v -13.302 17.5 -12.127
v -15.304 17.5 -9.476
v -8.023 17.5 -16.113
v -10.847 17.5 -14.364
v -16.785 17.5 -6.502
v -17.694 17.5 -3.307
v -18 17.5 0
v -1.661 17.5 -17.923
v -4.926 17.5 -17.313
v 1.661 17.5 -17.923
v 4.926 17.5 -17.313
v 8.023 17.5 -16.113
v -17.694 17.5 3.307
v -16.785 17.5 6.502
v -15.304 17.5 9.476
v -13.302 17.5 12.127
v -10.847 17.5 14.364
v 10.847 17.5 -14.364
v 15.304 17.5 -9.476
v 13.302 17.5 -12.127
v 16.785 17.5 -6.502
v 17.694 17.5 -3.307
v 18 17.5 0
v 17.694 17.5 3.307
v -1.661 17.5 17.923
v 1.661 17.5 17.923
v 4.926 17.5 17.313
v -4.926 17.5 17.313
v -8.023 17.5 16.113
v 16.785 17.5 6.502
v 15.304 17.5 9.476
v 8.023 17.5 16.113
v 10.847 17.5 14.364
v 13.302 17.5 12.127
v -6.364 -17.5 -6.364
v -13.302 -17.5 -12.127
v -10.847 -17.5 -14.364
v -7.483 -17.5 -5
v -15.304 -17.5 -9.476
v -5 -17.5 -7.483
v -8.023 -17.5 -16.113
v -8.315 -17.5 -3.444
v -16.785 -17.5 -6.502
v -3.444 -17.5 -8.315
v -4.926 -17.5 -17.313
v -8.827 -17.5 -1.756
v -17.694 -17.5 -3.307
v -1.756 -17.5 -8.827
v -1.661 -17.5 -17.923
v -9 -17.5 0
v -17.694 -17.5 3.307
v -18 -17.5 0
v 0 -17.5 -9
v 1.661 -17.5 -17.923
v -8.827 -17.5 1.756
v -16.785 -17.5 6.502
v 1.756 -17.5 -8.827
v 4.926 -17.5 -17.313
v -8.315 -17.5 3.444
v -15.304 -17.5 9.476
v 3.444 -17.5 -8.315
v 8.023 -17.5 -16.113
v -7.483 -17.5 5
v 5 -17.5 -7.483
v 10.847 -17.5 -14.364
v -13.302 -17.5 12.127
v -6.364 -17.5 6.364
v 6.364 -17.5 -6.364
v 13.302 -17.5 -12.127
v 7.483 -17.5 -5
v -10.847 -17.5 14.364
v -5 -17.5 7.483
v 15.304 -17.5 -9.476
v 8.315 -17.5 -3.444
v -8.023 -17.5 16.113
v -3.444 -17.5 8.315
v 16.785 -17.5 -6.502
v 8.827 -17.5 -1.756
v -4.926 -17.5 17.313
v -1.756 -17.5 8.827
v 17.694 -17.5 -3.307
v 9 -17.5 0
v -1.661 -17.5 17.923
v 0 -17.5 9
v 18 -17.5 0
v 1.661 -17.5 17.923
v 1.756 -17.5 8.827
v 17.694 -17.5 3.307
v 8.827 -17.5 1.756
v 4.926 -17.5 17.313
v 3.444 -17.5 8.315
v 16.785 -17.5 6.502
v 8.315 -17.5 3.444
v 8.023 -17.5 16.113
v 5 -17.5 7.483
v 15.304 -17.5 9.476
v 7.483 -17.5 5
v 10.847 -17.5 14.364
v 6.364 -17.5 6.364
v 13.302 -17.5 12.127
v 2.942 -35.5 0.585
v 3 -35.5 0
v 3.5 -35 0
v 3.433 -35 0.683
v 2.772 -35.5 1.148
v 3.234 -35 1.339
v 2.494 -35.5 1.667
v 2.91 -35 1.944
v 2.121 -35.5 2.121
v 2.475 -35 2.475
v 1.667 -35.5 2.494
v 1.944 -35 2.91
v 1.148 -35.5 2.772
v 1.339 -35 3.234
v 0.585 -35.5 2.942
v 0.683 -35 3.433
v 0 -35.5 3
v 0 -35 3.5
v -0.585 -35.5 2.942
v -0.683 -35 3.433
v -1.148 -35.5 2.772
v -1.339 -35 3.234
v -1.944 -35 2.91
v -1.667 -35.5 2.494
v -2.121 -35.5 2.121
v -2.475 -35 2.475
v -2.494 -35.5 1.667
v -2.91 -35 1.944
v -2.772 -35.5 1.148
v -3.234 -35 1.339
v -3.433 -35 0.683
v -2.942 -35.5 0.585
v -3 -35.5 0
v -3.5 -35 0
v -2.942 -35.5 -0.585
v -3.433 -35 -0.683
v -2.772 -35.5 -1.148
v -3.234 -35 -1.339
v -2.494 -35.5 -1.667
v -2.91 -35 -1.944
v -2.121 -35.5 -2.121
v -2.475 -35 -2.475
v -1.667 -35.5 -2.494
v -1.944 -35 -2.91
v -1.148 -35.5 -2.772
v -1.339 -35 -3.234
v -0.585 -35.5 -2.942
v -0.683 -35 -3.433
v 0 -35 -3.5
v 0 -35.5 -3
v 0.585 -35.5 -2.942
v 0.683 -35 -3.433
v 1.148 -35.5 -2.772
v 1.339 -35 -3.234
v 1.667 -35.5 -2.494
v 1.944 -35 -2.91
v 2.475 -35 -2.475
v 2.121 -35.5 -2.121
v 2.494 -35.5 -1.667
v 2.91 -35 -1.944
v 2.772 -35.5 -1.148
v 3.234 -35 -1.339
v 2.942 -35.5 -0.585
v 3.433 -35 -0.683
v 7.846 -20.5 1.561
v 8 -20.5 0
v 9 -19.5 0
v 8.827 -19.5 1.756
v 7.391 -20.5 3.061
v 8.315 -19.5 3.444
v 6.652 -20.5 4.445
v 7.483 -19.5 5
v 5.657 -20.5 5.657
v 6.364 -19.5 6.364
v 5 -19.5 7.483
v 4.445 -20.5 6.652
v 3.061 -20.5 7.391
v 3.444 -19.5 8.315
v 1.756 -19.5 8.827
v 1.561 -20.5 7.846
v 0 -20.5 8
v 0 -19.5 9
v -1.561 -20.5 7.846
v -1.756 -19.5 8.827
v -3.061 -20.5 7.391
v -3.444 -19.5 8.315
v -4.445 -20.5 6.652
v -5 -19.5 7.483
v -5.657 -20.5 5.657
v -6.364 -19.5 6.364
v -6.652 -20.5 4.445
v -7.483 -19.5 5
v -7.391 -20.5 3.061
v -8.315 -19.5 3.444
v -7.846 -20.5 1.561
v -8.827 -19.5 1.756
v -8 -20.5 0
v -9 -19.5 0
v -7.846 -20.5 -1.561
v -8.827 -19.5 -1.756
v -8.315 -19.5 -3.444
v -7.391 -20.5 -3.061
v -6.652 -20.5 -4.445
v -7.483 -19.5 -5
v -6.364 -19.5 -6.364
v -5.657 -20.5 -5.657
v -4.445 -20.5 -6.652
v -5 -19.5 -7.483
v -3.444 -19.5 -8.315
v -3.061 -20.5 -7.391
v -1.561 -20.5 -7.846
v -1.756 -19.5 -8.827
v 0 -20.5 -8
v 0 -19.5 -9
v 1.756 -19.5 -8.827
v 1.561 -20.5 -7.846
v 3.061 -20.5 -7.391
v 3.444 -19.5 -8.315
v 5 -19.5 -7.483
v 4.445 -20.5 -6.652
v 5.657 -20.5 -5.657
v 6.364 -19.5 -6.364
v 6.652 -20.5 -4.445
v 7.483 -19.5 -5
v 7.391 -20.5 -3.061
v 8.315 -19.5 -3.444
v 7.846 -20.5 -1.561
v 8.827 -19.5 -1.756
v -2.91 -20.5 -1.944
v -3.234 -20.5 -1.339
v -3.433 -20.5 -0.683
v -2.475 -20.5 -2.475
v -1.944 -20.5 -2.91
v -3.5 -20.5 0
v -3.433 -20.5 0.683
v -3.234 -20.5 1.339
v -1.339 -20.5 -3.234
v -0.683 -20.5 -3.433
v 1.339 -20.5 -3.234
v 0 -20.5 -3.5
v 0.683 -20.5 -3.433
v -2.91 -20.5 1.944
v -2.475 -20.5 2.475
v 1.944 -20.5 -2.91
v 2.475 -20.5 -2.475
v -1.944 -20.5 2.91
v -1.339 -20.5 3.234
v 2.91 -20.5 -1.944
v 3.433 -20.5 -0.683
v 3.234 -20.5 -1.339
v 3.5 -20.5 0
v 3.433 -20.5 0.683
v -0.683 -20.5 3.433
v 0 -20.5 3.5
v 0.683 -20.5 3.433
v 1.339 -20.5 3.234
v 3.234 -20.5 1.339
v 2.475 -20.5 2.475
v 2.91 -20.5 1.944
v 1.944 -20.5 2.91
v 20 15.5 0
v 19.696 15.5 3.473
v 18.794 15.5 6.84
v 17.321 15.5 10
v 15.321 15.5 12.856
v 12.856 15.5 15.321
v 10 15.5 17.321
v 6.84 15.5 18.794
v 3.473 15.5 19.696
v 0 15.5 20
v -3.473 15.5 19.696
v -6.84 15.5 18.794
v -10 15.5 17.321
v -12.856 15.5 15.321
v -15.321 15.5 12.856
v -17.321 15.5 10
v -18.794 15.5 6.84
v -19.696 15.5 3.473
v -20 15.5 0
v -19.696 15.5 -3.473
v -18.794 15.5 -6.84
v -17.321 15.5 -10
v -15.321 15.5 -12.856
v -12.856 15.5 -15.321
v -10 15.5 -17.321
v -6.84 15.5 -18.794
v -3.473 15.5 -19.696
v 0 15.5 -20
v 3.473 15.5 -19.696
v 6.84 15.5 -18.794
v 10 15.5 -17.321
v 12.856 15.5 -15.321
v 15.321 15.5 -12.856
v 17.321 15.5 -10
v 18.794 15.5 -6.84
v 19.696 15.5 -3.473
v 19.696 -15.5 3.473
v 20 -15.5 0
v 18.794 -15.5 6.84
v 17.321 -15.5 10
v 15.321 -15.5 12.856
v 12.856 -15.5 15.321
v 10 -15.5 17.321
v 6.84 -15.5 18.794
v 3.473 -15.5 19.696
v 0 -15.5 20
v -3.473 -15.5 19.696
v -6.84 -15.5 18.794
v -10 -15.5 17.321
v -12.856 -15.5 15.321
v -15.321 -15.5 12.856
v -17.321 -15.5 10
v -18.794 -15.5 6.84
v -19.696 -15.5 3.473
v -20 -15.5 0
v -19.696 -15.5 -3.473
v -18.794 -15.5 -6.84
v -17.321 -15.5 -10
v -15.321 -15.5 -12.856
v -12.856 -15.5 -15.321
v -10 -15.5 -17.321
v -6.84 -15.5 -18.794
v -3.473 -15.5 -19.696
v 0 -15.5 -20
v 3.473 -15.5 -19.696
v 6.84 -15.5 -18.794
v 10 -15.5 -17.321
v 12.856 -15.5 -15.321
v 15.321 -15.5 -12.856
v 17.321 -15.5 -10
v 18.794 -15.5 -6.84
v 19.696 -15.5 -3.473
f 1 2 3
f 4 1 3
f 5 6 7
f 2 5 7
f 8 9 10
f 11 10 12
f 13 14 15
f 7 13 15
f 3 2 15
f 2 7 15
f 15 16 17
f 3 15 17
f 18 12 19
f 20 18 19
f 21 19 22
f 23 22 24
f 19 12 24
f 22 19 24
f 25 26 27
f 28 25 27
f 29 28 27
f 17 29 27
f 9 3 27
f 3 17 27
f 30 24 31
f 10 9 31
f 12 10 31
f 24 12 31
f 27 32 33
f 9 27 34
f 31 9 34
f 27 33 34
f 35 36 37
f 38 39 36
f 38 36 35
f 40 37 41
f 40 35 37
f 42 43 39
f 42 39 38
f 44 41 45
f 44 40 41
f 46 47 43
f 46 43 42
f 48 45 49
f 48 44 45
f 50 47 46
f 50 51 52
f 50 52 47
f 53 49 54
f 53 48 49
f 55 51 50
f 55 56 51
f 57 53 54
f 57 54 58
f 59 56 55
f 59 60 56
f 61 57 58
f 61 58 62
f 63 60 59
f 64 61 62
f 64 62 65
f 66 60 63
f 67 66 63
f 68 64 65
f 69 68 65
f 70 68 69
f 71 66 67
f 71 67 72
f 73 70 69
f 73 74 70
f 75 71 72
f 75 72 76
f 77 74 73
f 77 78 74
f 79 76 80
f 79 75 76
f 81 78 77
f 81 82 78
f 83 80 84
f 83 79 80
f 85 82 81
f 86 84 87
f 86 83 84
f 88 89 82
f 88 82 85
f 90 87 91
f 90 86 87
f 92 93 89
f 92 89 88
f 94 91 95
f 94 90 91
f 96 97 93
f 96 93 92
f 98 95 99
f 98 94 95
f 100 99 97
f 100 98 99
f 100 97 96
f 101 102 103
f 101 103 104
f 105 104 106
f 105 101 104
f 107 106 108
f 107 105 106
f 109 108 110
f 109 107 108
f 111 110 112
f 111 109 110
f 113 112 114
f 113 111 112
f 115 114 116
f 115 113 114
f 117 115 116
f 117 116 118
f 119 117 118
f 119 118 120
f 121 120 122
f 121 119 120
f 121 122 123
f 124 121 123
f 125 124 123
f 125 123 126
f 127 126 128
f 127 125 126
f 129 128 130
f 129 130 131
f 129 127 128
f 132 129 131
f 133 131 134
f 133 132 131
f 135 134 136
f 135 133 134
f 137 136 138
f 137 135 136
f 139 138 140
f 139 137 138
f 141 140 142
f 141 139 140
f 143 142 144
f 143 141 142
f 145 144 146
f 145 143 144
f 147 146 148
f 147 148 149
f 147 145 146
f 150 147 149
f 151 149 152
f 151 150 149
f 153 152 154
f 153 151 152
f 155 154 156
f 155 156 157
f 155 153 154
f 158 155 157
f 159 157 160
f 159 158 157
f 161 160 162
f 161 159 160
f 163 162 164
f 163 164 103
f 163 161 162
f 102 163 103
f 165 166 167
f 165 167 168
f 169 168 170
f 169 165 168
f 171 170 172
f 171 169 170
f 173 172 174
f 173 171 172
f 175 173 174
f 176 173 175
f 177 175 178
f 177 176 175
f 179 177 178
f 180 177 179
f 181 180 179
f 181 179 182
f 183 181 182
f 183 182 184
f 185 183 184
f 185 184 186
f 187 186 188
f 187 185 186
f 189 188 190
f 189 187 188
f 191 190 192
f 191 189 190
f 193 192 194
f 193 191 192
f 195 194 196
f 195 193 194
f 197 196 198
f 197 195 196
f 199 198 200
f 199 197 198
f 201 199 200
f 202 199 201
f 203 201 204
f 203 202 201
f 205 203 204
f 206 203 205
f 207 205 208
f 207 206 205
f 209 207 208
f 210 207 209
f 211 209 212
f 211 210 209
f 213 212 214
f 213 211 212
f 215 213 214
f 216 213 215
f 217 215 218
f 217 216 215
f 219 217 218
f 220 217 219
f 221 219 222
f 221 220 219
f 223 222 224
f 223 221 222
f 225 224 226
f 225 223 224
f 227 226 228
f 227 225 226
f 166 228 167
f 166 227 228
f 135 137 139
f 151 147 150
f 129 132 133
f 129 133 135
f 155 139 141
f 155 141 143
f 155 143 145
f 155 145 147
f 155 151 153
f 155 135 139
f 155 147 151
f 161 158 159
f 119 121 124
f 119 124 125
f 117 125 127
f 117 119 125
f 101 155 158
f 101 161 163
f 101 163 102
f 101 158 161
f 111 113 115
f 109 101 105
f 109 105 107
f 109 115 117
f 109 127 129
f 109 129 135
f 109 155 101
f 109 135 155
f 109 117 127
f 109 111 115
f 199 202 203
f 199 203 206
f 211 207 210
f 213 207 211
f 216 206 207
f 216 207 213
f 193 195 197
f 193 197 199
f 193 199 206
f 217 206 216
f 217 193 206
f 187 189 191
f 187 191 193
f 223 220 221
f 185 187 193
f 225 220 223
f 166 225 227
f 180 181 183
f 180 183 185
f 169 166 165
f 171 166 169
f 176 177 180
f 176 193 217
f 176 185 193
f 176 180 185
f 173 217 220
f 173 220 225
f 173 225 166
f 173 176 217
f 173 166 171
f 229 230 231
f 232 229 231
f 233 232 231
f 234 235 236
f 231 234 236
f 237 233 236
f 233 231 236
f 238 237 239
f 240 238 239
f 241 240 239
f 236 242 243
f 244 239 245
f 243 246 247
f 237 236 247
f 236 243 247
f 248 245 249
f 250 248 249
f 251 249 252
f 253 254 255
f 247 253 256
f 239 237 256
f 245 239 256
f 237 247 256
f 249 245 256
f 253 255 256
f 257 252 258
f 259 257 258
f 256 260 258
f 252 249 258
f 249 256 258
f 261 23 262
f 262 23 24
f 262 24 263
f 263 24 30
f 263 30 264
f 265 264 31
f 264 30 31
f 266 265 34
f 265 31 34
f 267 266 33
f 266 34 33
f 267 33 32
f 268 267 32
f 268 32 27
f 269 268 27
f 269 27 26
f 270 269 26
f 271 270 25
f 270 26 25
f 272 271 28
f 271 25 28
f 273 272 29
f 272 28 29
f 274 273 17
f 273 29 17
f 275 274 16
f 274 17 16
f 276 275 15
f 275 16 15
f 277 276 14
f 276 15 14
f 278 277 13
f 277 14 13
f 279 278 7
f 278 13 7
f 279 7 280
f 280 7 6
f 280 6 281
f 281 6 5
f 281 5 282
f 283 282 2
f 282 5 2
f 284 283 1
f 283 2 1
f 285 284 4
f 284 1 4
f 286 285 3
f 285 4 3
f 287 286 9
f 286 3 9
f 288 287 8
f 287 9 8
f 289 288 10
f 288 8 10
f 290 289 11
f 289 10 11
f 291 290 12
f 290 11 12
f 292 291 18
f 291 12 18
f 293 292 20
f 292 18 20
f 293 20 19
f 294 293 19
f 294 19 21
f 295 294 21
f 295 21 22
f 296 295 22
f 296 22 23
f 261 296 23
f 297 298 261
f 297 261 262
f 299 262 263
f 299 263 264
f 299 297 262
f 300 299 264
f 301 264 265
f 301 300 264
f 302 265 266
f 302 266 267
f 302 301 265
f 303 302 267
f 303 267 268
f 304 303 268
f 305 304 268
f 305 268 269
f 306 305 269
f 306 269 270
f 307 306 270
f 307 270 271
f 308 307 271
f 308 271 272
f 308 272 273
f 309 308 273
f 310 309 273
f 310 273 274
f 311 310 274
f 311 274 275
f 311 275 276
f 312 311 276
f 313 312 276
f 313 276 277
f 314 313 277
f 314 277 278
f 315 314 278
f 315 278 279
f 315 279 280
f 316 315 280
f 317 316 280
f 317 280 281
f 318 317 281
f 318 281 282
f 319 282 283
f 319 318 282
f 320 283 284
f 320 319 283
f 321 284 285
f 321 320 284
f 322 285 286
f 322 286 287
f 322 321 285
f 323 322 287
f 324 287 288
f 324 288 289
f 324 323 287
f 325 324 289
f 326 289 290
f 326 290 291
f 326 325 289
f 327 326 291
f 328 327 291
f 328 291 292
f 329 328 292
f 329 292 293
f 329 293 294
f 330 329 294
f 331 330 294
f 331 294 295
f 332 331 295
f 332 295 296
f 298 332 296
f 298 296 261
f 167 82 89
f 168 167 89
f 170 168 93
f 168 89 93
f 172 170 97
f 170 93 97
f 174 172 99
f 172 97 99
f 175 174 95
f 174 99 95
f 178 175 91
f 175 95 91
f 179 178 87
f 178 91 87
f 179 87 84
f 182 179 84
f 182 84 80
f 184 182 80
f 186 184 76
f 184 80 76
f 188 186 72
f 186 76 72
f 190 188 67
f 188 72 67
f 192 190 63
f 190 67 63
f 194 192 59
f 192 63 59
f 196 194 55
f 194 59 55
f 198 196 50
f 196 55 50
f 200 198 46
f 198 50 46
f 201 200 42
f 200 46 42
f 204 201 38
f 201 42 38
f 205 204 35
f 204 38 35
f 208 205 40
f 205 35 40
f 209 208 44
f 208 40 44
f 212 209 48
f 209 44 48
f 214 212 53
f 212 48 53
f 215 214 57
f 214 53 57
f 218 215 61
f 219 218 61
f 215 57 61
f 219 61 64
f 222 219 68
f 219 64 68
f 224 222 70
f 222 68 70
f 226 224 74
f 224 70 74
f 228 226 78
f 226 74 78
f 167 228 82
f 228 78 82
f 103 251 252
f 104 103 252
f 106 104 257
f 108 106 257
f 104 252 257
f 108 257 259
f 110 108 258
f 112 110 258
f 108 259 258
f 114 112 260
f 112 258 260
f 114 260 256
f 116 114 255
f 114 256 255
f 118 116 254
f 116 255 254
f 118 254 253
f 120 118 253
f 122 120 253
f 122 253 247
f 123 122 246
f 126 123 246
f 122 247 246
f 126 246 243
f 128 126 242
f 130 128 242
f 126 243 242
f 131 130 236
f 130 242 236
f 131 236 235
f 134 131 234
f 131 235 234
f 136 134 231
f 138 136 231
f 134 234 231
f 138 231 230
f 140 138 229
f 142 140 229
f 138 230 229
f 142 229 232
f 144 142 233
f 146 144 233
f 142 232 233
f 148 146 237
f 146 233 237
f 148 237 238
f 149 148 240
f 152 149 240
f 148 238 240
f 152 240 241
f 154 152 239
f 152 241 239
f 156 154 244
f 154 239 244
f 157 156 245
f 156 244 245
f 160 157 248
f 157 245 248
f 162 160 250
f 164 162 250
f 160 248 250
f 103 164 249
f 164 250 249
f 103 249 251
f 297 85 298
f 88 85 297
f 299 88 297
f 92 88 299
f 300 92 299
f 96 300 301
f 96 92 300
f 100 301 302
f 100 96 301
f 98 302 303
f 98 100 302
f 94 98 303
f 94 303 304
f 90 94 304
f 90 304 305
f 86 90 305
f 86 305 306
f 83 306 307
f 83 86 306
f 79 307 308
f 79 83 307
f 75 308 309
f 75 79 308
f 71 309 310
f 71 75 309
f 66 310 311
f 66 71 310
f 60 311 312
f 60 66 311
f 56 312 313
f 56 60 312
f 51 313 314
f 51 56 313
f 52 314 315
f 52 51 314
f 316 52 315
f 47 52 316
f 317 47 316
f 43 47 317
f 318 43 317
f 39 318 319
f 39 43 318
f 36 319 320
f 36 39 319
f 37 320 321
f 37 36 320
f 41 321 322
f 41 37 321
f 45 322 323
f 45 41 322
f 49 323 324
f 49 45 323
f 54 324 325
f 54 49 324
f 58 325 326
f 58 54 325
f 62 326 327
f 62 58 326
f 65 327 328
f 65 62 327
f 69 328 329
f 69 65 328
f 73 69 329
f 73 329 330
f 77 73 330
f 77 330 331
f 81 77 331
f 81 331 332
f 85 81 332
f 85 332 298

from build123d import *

# Parameters (mm, degrees)
F0_R     = 20
F1_DEPTH = 17.5
F2_SIZE  = 2
F3_R     = 9
F4_DEPTH = 3
F5_R     = 3.5
F6_DEPTH = 15
F7_SIZE  = 0.5
F8_SIZE  = 1


with BuildPart() as f1:
    # F0 (on Front) → F1 (new body, symmetric)
    with BuildSketch(Plane.XZ):
        Circle(F0_R)
    extrude(amount=F1_DEPTH, both=True)

    # F2
    f2_edges = [f1.edges().sort_by_distance(p)[0] for p in [
        (-20, 17.5, 0),
        (-20, -17.5, 0),
    ]]
    chamfer(f2_edges, length=F2_SIZE)

    # F3 (on face) → F4 (join)
    with BuildSketch(Plane.XZ.offset(17.5)):
        Circle(F3_R)
    extrude(amount=F4_DEPTH)

    # F8
    f8_edges = [f1.edges().sort_by_distance(p)[0] for p in [
        (-9, -20.5, 0),
    ]]
    chamfer(f8_edges, length=F8_SIZE)


with BuildPart() as f6:
    # F5 (on face) → F6 (new body)
    with BuildSketch(Plane.XZ.offset(20.5)):
        Circle(F5_R)
    extrude(amount=F6_DEPTH)

    # F7
    f7_edges = [f6.edges().sort_by_distance(p)[0] for p in [
        (-3.5, -35.5, 0),
    ]]
    chamfer(f7_edges, length=F7_SIZE)


solid = Compound([f1.part, f6.part])
